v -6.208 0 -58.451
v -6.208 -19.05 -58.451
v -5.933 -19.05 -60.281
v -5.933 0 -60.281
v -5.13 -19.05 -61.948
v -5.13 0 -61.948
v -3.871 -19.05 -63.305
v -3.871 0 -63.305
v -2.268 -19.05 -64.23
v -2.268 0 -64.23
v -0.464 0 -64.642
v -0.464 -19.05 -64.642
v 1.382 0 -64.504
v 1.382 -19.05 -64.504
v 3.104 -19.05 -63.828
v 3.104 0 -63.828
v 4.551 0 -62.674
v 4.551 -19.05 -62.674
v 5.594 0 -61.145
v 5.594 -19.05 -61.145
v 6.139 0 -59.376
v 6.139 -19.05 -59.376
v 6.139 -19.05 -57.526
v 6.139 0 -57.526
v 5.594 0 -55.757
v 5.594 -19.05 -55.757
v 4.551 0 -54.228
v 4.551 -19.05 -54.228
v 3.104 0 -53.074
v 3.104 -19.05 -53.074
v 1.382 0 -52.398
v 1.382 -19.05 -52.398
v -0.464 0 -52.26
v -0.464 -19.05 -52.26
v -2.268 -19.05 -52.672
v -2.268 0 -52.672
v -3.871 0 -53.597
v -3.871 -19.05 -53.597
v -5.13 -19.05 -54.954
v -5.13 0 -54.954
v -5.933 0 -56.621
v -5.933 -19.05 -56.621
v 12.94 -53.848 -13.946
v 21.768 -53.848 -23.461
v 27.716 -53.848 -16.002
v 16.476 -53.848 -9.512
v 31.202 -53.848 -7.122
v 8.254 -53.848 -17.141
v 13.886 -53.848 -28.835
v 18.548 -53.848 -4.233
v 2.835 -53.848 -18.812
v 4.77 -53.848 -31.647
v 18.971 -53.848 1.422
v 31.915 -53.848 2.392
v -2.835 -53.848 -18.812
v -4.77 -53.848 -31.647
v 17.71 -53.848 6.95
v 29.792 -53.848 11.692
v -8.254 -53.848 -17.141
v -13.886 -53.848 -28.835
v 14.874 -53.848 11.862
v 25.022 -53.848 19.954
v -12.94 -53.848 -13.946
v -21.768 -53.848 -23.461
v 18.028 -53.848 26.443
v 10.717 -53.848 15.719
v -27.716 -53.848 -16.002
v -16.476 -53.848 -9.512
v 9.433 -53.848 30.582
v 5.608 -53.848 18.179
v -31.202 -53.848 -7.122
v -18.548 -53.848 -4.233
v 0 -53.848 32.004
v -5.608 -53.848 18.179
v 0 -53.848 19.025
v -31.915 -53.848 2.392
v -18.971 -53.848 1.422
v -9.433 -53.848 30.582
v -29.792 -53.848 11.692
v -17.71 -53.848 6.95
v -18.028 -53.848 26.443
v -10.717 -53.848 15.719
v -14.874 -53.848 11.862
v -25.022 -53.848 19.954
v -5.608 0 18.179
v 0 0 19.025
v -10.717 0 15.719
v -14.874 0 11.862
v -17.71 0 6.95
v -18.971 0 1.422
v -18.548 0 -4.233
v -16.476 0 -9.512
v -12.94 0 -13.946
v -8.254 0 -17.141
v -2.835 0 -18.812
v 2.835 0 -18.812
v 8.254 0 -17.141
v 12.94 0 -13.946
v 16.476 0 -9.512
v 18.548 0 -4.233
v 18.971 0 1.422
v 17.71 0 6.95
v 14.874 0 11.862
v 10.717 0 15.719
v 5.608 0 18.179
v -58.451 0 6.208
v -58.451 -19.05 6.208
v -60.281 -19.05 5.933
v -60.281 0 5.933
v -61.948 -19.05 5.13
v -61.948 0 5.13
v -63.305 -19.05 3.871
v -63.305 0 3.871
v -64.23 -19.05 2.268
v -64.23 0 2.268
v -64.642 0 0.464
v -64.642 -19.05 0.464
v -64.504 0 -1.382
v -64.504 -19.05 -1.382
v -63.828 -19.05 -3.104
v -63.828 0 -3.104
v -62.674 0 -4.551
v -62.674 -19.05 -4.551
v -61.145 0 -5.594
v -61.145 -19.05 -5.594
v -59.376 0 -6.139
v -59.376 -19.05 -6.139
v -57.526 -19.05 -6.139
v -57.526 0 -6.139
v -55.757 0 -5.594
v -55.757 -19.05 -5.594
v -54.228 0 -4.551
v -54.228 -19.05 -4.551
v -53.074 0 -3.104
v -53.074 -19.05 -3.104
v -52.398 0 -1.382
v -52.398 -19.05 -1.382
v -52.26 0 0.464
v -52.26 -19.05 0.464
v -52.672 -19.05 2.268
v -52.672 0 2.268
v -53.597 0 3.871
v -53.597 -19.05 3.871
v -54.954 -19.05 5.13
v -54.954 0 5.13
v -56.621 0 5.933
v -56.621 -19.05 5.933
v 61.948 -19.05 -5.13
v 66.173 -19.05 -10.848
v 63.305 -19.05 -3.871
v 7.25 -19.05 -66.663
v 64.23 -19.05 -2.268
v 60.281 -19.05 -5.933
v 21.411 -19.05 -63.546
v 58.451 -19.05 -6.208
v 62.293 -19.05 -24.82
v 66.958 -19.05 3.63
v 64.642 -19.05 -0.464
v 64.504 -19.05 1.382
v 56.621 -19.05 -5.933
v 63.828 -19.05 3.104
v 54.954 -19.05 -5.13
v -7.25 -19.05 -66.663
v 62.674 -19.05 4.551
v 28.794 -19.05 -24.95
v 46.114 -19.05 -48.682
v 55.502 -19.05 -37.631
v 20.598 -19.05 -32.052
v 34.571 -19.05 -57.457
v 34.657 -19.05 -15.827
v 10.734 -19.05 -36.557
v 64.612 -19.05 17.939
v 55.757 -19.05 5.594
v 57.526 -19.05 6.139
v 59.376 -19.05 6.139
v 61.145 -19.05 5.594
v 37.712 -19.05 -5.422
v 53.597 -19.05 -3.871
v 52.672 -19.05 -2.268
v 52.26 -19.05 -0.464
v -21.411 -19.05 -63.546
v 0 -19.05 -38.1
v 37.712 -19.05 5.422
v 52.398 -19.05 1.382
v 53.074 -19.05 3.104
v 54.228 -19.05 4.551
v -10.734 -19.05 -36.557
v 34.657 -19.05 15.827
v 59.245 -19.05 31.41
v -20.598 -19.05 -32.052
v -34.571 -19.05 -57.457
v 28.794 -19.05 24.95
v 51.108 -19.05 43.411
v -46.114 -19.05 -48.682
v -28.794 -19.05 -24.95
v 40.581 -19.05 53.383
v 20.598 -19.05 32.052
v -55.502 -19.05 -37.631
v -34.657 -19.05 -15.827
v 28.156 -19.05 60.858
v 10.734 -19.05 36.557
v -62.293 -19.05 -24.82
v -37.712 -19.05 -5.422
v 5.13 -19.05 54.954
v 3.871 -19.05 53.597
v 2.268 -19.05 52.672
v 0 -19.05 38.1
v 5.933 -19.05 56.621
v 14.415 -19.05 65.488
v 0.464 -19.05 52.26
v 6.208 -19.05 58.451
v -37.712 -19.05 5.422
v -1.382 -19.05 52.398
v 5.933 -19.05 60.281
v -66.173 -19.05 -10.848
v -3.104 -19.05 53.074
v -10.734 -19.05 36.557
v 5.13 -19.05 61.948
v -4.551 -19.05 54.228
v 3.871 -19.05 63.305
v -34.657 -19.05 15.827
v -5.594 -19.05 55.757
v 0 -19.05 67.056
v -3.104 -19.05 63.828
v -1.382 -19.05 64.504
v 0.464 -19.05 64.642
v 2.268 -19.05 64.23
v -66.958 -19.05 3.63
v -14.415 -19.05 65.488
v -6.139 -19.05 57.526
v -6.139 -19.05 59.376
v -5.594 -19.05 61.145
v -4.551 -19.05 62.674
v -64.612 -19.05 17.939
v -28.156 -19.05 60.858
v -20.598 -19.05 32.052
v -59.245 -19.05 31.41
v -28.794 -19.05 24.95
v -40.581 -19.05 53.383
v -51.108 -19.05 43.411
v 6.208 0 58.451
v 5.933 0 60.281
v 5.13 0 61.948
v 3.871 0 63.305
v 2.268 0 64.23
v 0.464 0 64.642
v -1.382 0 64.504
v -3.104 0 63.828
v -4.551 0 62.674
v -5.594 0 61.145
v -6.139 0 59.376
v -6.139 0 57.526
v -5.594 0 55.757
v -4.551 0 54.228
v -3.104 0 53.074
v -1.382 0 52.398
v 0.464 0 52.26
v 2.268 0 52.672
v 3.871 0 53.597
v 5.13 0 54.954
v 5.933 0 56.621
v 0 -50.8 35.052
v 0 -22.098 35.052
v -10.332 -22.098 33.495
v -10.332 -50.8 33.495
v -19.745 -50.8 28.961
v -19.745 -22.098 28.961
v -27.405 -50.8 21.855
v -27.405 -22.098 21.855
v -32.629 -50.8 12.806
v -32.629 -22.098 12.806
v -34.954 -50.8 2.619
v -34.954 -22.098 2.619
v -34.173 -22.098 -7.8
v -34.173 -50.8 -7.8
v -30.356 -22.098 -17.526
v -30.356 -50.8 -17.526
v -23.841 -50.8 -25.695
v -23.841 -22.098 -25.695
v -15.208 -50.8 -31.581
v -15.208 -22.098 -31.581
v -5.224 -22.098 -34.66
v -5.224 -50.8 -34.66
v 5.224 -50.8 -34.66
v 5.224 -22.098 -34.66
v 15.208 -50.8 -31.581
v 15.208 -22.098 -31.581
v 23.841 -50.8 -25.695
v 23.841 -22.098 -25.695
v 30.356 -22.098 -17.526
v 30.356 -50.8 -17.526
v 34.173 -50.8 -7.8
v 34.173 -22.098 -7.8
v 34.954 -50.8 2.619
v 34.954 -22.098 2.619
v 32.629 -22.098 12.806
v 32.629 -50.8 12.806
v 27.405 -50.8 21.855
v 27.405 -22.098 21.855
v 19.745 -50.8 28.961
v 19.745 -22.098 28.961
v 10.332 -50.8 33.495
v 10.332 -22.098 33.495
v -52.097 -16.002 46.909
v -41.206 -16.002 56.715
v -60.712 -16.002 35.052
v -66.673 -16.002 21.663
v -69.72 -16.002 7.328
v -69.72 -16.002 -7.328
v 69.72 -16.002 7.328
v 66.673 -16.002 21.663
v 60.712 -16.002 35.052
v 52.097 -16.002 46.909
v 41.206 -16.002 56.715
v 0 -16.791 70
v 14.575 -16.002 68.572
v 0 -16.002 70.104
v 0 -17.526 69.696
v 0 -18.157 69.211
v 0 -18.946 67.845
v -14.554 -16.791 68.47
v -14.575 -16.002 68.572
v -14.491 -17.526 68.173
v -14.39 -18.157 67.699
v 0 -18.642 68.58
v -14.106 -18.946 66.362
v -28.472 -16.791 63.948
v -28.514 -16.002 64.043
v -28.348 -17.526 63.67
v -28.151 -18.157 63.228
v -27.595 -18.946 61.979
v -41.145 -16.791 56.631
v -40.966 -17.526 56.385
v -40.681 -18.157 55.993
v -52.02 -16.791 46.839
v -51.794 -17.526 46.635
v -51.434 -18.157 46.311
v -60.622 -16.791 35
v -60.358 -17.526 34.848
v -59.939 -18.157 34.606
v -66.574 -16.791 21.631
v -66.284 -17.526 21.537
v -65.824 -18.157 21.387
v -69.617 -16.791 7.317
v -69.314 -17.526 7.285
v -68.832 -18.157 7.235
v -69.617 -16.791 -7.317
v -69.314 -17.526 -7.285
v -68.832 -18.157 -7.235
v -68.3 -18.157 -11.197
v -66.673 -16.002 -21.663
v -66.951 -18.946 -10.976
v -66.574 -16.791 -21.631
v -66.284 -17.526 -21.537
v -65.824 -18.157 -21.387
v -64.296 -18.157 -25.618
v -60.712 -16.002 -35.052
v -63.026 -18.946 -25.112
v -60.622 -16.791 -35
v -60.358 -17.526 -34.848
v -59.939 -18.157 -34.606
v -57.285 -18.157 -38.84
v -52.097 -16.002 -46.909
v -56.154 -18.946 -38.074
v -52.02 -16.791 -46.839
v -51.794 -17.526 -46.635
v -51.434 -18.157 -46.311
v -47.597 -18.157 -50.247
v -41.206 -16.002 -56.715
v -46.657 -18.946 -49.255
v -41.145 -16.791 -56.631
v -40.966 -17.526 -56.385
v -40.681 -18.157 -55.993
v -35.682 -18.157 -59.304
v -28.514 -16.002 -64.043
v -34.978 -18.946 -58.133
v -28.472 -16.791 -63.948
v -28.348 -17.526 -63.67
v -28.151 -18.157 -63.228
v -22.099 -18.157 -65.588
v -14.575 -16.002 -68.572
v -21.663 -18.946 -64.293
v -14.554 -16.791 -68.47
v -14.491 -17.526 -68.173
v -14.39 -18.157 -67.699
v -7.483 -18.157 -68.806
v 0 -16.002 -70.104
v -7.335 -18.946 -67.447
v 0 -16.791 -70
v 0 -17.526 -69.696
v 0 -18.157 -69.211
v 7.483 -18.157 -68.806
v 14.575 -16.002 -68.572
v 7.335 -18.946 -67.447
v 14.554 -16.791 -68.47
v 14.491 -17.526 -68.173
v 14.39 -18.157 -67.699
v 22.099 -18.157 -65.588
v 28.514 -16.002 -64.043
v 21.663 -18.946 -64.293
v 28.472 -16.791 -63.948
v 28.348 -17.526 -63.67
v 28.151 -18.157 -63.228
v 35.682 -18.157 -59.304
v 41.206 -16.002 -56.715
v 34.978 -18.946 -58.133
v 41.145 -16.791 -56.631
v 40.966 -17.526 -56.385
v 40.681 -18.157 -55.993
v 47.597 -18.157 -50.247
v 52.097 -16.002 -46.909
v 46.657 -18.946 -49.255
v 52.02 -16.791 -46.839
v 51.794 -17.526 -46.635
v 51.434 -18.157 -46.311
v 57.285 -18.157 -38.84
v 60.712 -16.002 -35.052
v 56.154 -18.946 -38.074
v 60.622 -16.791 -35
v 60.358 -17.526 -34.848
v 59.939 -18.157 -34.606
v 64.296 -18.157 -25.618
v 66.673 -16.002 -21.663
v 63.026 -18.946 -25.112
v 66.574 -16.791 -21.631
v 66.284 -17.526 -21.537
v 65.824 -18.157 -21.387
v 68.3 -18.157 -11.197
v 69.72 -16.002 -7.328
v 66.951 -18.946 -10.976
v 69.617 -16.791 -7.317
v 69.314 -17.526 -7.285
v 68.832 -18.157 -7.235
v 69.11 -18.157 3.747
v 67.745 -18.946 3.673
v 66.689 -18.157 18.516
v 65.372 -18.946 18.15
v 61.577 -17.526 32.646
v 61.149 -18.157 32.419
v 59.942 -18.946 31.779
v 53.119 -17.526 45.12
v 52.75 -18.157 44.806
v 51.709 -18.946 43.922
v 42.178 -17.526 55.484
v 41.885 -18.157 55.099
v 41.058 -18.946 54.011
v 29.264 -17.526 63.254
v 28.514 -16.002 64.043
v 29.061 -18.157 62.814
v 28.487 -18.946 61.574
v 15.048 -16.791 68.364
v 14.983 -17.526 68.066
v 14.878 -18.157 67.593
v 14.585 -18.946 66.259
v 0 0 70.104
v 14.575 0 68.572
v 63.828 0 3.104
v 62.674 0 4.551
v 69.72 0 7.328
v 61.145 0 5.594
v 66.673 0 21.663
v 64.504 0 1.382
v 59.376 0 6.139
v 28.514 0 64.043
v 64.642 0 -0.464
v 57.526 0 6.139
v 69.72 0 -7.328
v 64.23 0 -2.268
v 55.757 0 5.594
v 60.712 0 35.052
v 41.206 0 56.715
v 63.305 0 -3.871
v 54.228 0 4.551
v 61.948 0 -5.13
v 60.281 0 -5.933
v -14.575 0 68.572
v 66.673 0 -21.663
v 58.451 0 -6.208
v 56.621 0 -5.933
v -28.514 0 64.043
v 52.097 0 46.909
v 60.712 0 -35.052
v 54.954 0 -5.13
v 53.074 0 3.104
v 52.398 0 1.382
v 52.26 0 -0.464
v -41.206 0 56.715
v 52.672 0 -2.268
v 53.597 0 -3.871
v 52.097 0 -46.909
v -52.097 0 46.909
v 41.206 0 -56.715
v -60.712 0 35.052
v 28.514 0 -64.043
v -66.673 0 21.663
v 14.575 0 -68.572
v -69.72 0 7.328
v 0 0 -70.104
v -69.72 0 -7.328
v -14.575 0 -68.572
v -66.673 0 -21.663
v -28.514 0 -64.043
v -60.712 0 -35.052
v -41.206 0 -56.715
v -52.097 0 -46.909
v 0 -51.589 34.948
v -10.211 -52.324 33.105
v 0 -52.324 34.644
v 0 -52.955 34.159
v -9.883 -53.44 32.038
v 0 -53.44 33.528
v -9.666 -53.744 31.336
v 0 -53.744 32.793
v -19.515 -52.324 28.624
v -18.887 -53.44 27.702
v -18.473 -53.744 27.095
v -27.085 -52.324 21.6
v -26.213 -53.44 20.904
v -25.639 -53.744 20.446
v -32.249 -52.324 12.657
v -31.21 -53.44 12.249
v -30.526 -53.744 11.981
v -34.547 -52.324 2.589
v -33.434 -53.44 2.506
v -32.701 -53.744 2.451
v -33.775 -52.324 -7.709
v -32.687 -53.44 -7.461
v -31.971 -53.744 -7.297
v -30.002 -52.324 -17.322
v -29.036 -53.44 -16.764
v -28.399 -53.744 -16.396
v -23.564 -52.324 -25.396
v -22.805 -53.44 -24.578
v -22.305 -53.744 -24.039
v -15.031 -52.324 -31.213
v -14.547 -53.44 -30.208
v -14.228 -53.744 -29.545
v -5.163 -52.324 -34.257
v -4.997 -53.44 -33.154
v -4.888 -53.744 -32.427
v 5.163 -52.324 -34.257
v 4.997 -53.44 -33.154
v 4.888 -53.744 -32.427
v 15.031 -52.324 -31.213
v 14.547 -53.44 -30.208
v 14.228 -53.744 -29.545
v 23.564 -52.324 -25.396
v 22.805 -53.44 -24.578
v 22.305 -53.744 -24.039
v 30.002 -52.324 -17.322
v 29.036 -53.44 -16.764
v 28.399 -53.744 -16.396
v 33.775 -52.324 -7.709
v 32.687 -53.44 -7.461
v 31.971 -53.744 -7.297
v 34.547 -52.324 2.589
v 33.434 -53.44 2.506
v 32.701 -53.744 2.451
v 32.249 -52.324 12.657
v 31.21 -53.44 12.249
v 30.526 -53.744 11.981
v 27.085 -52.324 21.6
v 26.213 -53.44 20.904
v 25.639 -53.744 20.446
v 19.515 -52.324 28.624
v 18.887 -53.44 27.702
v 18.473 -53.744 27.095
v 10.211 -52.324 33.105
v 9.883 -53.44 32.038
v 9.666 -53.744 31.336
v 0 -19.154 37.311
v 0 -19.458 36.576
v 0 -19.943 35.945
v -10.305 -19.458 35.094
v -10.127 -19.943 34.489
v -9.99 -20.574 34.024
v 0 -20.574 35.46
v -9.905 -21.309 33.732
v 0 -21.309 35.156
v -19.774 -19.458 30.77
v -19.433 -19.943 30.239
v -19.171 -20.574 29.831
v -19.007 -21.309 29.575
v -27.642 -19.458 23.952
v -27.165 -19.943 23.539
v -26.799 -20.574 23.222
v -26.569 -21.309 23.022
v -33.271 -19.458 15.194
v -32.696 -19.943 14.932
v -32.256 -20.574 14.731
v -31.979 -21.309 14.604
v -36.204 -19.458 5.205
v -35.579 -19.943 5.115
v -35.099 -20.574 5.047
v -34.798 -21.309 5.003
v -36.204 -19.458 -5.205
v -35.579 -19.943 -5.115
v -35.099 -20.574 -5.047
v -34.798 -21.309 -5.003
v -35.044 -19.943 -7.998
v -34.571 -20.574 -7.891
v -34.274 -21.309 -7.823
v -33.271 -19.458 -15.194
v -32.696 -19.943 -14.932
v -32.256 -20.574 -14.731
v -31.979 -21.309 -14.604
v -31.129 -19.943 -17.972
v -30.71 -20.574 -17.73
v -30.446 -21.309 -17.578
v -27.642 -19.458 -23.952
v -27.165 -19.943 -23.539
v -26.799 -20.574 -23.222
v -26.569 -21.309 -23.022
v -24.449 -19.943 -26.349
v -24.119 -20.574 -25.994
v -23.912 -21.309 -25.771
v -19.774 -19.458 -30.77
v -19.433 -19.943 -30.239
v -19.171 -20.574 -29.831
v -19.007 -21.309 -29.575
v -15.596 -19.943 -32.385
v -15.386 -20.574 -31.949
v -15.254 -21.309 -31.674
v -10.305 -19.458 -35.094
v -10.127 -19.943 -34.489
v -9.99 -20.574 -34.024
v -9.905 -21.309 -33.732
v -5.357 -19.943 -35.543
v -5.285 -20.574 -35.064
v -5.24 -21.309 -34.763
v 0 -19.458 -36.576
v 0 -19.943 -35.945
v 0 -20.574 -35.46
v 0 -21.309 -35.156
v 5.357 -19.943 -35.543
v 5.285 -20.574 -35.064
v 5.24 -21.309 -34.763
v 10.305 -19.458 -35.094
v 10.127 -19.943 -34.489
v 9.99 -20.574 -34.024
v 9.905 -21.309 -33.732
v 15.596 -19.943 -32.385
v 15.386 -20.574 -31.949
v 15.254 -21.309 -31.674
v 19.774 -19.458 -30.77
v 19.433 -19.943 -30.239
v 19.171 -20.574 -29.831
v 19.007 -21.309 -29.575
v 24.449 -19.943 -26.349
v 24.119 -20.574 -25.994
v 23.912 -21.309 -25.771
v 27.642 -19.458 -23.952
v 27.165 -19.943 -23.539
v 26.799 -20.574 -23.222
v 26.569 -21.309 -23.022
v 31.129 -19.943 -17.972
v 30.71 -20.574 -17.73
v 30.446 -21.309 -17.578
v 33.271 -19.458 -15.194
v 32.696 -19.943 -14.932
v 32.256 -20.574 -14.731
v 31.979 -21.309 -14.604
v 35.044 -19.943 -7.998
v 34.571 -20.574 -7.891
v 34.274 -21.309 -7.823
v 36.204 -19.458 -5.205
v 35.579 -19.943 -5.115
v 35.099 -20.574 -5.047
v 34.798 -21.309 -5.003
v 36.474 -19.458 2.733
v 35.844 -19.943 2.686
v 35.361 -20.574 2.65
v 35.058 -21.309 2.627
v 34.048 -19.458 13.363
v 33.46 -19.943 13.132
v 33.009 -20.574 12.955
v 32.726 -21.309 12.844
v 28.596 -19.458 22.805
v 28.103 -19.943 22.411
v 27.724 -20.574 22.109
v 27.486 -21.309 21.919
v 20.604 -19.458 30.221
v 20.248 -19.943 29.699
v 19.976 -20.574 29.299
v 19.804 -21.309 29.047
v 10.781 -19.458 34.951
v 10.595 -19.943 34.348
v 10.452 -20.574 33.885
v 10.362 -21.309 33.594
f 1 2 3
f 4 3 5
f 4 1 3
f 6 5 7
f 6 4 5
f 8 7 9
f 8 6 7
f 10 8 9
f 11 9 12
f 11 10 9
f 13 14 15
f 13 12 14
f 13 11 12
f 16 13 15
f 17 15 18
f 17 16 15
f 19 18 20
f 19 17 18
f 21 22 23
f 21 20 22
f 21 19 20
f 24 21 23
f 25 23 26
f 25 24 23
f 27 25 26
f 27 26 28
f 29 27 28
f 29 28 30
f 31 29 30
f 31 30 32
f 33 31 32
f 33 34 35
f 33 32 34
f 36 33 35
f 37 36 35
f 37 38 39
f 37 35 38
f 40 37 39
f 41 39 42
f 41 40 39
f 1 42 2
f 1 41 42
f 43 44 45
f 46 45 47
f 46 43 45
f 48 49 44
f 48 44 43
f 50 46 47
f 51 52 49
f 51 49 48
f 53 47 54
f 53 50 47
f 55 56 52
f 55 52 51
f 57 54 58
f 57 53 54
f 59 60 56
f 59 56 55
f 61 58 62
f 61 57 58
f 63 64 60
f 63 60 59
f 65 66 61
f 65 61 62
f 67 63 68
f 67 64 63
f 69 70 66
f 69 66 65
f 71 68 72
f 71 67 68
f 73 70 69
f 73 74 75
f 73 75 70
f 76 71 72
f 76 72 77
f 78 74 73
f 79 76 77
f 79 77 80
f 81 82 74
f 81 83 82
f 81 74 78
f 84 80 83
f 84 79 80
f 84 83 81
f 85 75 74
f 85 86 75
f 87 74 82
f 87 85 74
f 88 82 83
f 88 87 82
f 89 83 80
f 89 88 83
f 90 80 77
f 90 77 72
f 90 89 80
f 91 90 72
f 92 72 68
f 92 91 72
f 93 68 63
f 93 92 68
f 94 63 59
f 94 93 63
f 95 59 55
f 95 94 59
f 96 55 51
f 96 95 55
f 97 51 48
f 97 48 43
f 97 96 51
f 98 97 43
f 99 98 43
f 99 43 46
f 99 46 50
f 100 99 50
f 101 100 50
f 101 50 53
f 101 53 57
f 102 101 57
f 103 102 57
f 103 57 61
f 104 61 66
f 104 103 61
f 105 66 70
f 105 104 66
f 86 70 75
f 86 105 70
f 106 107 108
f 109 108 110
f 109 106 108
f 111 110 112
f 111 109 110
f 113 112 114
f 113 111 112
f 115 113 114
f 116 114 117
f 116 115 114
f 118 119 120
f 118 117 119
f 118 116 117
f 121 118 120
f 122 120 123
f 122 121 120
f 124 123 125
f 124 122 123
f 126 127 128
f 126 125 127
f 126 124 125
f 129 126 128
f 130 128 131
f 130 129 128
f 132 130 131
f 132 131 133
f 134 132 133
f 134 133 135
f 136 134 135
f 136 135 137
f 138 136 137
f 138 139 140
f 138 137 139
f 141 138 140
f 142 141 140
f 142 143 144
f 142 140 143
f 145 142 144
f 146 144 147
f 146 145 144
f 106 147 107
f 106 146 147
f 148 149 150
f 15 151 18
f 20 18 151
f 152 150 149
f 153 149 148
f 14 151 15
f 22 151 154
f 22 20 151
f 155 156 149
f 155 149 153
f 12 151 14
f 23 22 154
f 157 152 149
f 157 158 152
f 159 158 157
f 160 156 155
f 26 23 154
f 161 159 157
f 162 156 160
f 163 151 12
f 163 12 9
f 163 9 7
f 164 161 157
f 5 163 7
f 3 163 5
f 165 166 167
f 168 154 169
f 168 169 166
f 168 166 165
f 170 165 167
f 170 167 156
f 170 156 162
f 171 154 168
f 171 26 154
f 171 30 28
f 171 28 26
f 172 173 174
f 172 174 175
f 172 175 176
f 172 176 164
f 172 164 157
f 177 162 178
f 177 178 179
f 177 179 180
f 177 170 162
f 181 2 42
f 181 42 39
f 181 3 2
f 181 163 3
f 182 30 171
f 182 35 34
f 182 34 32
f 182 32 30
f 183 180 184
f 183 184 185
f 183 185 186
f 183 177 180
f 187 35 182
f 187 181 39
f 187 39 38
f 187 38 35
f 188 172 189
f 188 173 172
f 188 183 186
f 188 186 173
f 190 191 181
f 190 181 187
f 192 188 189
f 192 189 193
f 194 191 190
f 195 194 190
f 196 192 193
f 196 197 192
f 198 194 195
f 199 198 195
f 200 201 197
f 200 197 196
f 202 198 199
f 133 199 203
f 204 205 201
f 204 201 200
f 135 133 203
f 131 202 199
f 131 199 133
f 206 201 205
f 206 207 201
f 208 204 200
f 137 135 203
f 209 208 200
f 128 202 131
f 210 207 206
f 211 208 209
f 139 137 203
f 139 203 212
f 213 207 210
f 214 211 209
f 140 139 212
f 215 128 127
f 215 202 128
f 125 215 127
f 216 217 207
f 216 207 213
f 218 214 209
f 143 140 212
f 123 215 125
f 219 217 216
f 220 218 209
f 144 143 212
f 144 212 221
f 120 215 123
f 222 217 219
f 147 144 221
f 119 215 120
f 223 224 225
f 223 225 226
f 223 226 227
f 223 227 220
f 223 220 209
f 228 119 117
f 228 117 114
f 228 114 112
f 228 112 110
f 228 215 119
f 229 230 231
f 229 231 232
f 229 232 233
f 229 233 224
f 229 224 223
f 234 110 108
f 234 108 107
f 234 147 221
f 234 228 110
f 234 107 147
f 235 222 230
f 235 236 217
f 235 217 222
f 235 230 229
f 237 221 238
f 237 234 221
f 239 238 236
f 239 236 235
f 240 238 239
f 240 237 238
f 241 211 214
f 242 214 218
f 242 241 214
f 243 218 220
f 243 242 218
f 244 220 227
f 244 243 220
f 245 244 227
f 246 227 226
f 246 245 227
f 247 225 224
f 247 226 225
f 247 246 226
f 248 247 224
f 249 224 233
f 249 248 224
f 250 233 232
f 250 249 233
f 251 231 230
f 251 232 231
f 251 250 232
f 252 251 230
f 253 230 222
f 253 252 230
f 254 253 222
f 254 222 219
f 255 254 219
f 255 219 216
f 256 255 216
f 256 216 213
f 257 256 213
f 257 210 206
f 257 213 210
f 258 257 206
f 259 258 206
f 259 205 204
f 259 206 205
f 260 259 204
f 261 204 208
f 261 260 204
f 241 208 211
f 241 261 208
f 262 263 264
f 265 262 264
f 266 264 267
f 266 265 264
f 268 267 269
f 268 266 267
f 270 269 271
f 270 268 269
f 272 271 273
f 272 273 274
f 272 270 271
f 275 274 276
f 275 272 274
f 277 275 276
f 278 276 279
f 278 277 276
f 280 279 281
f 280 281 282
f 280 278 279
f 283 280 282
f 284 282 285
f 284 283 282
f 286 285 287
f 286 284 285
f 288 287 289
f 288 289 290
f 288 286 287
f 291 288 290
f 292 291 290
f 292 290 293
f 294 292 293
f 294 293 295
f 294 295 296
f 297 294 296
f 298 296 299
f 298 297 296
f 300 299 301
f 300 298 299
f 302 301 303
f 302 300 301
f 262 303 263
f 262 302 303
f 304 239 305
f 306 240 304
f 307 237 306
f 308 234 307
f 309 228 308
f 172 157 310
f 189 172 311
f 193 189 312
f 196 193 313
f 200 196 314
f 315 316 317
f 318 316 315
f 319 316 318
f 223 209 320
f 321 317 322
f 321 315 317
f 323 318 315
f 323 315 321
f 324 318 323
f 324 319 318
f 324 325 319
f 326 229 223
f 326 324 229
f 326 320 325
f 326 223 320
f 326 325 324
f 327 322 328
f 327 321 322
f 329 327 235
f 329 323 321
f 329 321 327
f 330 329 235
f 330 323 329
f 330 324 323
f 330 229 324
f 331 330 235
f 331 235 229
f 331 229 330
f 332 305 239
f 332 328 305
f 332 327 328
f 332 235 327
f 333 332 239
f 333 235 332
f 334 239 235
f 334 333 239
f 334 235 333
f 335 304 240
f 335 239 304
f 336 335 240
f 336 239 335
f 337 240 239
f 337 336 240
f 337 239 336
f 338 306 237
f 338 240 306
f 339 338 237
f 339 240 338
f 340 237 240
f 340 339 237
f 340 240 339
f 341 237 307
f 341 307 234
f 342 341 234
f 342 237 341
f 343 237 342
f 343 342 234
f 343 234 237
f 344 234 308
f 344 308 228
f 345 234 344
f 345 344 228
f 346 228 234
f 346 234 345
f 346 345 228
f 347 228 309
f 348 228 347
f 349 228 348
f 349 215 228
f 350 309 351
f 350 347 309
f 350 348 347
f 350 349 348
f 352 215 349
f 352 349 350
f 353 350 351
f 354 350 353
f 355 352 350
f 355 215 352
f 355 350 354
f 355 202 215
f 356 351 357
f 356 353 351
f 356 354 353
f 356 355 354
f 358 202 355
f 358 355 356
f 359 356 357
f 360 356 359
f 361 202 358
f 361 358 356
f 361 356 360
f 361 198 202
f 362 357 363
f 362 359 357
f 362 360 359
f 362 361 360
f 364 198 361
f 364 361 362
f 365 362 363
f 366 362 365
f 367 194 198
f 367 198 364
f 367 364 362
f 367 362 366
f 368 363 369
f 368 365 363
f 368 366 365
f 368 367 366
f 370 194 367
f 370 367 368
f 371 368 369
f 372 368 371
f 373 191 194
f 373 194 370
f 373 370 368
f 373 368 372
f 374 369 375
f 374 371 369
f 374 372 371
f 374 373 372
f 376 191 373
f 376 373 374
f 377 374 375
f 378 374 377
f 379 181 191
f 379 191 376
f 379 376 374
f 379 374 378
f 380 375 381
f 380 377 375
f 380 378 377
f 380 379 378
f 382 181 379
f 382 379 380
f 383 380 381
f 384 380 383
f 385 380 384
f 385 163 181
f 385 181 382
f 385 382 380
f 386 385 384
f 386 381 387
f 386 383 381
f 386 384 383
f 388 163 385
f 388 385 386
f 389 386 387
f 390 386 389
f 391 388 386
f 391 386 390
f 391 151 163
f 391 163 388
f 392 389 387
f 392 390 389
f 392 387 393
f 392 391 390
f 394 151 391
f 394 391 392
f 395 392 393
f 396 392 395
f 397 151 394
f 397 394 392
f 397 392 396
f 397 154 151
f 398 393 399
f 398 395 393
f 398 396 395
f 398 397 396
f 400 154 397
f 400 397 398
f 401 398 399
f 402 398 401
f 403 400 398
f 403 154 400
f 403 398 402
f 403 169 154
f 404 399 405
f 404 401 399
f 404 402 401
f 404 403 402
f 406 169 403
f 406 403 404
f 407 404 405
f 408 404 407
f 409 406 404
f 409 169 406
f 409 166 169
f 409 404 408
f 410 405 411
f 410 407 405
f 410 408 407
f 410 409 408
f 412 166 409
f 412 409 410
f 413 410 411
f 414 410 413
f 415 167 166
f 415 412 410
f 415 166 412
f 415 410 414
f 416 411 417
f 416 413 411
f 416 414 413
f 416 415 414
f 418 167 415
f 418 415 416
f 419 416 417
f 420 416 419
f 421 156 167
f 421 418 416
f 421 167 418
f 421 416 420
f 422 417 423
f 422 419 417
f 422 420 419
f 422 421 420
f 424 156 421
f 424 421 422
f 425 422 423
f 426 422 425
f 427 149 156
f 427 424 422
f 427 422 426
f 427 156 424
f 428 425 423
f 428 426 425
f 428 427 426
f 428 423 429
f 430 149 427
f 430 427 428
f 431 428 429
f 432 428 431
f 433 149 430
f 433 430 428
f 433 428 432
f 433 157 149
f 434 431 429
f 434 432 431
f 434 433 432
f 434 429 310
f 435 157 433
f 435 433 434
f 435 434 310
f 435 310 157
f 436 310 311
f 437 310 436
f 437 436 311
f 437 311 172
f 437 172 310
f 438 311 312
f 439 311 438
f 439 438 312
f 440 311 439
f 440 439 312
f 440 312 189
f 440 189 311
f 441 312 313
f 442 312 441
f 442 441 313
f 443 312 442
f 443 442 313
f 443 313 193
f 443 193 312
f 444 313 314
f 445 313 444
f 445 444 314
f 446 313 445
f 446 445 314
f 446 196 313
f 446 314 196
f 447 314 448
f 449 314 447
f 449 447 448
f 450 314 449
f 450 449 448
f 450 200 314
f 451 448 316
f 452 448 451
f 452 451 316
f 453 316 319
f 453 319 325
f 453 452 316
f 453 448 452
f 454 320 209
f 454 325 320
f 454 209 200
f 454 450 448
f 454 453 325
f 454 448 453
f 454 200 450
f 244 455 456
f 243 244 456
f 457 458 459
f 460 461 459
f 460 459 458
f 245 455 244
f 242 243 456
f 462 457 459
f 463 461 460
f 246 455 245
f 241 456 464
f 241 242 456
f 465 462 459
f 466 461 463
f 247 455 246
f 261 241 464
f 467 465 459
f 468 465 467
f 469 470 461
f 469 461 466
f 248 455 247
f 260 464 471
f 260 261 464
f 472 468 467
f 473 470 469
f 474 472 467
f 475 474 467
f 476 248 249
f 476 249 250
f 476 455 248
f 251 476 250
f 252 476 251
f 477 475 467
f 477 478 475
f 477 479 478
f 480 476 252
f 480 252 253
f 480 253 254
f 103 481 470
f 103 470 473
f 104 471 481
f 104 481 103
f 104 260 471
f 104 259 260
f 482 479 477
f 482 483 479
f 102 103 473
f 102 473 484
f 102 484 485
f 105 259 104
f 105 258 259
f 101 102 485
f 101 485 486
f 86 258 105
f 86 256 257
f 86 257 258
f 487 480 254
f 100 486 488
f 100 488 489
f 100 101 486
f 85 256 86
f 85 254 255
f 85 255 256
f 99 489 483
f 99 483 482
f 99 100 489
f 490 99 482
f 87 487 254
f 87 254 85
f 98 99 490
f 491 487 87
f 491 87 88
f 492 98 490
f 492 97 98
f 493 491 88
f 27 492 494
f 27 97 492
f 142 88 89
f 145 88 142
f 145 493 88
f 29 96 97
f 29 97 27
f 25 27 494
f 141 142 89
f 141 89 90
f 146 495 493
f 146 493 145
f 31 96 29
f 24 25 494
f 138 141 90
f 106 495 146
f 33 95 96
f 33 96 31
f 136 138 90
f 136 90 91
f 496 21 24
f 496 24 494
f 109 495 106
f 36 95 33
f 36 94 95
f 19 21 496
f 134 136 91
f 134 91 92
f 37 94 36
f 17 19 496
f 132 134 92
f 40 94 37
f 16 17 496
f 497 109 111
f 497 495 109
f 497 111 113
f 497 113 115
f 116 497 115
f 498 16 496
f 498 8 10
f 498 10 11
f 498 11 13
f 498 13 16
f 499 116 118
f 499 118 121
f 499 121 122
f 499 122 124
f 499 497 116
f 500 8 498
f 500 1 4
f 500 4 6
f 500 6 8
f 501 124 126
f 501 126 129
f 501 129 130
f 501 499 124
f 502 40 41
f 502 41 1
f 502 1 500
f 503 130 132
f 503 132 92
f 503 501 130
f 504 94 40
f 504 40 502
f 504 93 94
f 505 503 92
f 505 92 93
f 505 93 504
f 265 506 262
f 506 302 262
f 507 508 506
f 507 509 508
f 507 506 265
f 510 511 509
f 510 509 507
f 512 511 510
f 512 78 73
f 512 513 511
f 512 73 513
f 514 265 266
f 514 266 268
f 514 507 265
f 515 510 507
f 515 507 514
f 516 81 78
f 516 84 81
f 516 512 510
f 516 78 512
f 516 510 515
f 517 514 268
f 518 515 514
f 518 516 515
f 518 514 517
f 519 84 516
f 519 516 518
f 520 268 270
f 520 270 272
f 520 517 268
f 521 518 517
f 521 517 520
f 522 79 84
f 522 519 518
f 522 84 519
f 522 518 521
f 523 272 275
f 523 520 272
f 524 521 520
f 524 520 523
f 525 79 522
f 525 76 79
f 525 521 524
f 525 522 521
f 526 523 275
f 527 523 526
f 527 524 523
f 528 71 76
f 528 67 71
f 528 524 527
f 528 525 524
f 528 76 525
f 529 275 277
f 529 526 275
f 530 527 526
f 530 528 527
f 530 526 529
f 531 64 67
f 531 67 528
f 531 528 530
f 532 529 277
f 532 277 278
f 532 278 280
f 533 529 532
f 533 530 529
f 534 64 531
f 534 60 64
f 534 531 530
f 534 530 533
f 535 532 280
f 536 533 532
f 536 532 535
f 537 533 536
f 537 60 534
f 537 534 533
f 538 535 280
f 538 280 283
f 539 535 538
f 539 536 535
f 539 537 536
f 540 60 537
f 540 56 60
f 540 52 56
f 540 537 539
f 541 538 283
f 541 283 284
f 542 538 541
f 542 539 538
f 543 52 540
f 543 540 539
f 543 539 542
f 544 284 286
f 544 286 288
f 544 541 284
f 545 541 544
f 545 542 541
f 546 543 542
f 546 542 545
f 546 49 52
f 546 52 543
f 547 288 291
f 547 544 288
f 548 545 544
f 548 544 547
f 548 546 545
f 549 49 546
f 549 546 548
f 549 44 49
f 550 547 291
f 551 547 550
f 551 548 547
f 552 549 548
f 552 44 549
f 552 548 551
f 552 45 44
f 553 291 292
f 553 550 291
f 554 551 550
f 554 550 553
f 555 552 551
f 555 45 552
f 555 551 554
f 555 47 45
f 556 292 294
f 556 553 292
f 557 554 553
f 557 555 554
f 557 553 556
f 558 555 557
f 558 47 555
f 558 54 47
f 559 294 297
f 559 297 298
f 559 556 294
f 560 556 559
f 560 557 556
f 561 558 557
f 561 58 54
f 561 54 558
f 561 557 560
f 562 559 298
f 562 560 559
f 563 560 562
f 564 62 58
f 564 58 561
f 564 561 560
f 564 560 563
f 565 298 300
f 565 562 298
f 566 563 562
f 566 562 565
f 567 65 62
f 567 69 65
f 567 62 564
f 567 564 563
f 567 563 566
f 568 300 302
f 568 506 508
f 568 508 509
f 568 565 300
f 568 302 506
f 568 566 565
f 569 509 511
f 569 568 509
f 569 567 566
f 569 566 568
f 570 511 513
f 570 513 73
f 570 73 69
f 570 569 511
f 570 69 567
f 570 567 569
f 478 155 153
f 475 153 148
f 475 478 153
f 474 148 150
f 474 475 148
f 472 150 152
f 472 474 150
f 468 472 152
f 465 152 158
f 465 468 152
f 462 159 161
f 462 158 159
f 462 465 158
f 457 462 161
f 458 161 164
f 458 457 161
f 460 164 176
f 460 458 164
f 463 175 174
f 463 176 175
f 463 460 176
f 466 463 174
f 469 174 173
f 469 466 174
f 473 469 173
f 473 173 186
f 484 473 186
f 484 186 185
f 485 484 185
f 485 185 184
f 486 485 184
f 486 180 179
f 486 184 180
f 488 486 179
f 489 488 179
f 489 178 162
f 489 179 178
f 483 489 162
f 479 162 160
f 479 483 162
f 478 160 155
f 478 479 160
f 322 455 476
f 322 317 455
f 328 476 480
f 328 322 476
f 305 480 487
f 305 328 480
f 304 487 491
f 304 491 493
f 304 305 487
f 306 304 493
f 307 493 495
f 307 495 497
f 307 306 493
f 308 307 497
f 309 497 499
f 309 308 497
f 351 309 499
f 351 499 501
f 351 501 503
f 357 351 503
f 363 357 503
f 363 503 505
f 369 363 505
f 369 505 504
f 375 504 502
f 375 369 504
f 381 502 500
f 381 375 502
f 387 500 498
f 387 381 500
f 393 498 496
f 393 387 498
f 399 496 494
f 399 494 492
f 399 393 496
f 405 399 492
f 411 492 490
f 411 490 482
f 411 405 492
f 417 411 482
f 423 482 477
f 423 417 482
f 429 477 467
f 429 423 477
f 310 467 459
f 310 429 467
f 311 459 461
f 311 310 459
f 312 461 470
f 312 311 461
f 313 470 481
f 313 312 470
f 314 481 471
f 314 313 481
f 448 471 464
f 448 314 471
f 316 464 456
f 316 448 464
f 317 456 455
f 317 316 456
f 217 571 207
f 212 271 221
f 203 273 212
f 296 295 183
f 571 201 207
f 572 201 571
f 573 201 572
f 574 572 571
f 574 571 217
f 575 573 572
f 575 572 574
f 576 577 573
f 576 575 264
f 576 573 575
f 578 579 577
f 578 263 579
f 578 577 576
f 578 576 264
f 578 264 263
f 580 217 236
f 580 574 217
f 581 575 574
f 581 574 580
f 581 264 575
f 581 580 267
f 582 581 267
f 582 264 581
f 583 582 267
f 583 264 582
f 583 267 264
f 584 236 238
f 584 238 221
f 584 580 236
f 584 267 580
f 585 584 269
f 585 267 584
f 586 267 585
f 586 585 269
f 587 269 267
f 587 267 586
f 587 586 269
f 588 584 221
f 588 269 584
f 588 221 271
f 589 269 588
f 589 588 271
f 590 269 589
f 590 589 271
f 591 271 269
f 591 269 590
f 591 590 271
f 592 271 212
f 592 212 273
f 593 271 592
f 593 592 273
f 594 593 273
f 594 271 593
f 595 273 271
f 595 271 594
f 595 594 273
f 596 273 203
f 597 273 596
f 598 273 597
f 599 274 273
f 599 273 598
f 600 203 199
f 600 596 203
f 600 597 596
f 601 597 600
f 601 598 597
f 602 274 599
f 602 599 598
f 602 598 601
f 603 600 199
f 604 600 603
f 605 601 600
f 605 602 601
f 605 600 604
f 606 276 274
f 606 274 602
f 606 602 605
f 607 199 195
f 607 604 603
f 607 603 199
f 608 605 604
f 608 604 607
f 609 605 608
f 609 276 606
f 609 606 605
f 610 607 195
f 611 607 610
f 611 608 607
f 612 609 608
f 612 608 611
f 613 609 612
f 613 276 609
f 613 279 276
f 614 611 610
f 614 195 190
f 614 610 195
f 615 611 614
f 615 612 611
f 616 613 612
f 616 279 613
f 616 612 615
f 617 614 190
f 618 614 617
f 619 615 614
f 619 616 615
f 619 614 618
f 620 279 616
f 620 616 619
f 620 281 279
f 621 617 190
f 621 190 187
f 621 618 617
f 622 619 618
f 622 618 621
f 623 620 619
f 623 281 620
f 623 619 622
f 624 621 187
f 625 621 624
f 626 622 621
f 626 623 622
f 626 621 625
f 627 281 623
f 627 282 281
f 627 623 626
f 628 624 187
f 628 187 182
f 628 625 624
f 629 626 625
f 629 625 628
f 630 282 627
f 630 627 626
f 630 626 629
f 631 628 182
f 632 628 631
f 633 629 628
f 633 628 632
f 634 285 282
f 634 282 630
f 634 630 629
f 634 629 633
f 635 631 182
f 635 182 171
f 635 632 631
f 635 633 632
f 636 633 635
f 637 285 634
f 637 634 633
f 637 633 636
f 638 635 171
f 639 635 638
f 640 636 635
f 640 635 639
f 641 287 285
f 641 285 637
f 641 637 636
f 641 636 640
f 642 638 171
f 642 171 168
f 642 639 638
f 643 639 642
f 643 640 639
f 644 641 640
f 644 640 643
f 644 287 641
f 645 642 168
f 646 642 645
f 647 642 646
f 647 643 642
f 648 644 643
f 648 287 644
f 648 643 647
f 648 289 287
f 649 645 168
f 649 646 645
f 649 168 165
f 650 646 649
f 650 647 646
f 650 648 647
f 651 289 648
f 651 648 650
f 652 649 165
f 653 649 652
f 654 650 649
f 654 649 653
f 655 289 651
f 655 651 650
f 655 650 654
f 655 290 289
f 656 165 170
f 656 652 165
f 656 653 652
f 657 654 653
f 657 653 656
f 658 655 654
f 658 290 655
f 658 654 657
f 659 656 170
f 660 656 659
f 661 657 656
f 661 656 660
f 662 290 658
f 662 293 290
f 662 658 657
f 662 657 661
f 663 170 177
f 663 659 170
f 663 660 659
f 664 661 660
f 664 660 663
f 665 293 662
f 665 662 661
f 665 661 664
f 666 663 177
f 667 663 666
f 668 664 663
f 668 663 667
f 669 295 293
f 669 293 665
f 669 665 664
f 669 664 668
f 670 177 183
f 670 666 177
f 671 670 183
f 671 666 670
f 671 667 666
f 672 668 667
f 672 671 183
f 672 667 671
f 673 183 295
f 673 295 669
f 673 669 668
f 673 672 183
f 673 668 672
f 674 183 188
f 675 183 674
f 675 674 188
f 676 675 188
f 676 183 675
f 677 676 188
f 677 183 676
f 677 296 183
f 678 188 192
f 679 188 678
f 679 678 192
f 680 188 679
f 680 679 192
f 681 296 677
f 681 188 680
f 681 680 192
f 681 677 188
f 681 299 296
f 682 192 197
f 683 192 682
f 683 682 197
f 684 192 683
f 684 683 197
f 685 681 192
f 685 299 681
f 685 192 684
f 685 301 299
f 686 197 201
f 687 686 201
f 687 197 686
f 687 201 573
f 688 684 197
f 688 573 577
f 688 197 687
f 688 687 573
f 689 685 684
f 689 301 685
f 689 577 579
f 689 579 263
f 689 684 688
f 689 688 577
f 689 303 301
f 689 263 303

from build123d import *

# Parameters (mm, degrees)
F2_R            = 6.2084574244
F3_DEPTH        = 53.848
F3_COPIES_COUNT = 4
F6_W            = 53.848
F6_H            = 19.0246
F8_R            = 3.048


# Not quite as in the source:
# - a pattern or mirror of a feature is missing from the dataset's text; its kind, count and spacing are read off the source's solid


with BuildPart() as f1:
    # F0 (on Right) → F1 (revolve)
    with BuildSketch(Plane.YZ):
        with BuildLine():
            Line((-19.05, 0), (0, 0))
            Line((0, 0), (0, 70.104))
            Line((0, 70.104), (-16.002, 70.104))
            ThreePointArc((-16.002, 70.104), (-18.1572614691, 69.2112614691), (-19.05, 67.056))
            Line((-19.05, 67.056), (-19.05, 0))
        make_face()
    revolve(axis=Axis((0, -9.525, 0), (0, -1, 0)))

    # F2 (on Front) → F3 (cut)
    with BuildSketch(Plane.XZ):
        with Locations((0, 58.4511086345)):
            Circle(F2_R)
    f3 = extrude(amount=F3_DEPTH, mode=Mode.SUBTRACT)

    # F3_copies: F3 ×4 about axis
    f3_copies_axis = Axis((0, 0, 0), (0, 1, 0))
    for i in range(1, F3_COPIES_COUNT):
        add(f3.rotate(f3_copies_axis, i * 360 / F3_COPIES_COUNT), mode=Mode.SUBTRACT)

    # F4 (on Right) → F5 (revolve)
    with BuildSketch(Plane.YZ):
        with BuildLine():
            Line((-53.848, 0), (0, 0))
            Line((0, 0), (0, 35.052))
            Line((0, 35.052), (-50.8, 35.052))
            ThreePointArc((-50.8, 35.052), (-52.9552614691, 34.1592614691), (-53.848, 32.004))
            Line((-53.848, 32.004), (-53.848, 0))
        make_face()
    revolve(axis=Axis((0, -26.924, 0), (0, -1, 0)))

    # F6 (on Right) → F7 (revolve, cut)
    with BuildSketch(Plane.YZ):
        with Locations((-26.924, 9.5123)):
            Rectangle(F6_W, F6_H)
    revolve(axis=Axis((0, -26.924, 0), (0, -1, 0)), mode=Mode.SUBTRACT)

    # F8
    f8_edges = [f1.edges().sort_by_distance(p)[0] for p in [
        (0, -19.05, -35.052),
    ]]
    fillet(f8_edges, radius=F8_R)


solid = f1.part
